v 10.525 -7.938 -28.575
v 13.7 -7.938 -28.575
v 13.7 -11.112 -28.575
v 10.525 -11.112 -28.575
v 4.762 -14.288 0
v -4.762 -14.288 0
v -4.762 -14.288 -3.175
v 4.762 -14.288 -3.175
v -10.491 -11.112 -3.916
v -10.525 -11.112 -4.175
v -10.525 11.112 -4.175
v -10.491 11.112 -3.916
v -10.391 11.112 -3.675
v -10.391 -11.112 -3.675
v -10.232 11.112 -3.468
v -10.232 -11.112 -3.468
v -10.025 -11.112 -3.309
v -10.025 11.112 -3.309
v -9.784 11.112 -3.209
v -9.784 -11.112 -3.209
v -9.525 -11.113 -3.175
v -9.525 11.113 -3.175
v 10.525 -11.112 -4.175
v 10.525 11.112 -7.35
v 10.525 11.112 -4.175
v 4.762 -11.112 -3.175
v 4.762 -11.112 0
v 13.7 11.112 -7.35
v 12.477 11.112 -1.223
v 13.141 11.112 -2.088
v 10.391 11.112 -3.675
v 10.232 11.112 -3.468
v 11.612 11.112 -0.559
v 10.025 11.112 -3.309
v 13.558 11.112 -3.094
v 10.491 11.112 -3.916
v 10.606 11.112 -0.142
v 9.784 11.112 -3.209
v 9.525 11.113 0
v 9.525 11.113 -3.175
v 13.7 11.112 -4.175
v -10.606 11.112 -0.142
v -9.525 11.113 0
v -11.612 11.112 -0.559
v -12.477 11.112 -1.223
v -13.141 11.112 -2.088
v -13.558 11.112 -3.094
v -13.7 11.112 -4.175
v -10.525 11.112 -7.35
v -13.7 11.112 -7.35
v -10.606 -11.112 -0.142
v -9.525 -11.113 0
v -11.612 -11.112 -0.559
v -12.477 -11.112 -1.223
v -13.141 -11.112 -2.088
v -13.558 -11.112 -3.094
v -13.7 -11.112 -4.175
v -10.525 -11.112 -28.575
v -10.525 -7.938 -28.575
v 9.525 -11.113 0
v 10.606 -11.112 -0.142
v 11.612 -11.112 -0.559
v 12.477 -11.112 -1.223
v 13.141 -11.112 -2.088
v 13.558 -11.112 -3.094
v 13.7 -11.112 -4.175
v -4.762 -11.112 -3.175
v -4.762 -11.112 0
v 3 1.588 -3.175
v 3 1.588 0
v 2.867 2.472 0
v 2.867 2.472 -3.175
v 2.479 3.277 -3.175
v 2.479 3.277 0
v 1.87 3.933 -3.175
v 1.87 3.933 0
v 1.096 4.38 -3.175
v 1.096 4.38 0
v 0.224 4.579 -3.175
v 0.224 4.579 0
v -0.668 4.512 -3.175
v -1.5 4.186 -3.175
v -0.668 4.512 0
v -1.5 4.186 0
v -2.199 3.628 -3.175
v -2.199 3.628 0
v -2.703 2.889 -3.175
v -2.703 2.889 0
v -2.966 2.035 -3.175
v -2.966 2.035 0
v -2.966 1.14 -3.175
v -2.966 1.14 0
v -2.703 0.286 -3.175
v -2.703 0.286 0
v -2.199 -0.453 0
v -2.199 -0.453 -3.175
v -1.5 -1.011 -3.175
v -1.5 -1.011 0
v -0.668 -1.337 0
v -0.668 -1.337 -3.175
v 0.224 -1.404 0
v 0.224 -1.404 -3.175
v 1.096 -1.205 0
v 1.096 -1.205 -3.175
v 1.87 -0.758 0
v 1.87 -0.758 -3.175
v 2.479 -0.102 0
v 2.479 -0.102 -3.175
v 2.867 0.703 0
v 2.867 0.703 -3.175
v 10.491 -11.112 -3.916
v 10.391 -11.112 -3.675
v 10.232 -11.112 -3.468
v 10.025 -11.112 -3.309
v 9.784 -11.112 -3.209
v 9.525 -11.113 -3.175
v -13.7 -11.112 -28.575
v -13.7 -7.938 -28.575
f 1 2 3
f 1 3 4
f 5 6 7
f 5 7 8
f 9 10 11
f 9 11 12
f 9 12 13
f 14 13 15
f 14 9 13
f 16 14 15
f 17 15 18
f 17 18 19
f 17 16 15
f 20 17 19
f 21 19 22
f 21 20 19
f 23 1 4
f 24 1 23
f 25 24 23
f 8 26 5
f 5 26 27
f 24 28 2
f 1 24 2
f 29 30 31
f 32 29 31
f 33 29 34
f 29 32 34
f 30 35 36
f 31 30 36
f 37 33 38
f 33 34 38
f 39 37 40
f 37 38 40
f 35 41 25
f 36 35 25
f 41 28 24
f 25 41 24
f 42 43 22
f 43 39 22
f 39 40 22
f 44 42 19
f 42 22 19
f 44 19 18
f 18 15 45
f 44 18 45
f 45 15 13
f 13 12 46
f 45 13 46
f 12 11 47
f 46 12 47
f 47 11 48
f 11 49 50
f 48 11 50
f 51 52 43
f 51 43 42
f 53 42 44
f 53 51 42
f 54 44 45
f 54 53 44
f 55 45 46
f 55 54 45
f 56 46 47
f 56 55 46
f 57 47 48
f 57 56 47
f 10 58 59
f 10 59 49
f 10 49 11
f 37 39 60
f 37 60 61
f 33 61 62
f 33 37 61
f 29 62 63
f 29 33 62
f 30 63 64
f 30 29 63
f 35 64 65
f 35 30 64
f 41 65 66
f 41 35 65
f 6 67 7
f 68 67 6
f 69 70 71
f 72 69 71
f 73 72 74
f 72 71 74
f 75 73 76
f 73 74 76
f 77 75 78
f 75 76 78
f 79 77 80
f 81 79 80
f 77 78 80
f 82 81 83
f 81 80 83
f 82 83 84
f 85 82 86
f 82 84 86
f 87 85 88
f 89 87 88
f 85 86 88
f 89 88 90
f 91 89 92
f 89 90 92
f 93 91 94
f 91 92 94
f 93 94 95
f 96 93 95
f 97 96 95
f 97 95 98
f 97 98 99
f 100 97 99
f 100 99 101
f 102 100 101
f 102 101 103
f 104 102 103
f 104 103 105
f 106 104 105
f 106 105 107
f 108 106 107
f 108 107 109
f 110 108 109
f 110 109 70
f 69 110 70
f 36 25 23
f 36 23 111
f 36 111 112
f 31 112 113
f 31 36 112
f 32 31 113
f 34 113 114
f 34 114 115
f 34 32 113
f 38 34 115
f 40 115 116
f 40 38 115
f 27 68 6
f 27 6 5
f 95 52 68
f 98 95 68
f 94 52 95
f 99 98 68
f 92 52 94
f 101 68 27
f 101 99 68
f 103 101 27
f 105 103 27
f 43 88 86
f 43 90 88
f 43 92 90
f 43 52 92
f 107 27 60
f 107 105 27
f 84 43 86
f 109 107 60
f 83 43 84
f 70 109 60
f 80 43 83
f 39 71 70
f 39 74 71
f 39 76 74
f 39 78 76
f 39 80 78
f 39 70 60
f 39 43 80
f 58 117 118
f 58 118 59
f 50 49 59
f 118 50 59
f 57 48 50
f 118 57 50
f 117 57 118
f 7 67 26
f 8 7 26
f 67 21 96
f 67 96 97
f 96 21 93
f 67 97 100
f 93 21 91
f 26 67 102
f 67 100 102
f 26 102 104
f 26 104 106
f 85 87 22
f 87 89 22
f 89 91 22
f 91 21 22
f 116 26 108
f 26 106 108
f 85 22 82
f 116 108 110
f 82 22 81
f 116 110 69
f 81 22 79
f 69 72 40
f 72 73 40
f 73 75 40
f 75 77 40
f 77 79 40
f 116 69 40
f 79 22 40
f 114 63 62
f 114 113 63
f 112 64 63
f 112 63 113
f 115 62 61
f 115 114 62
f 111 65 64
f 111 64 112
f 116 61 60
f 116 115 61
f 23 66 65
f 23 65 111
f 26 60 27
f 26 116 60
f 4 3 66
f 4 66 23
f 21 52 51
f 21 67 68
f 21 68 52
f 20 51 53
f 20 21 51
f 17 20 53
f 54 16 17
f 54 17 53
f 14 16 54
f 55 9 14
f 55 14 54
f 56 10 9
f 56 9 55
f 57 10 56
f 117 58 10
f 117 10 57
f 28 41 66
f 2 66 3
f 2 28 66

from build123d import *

# Parameters (mm, degrees)
SKETCH1_W           = 19.05
SKETCH1_H           = 22.225
BASE_FLANGE1_DEPTH  = 3.175
EDGE_FLANGE1_DEPTH  = 22.225
EDGE_FLANGE2_DEPTH  = 22.225
CUT_EXTRUDE1_DEPTH  = 42.119074421
SKETCH13_W          = 9.525
SKETCH13_H          = 3.175
BOSS_EXTRUDE1_DEPTH = 3.175
CUT_EXTRUDE2_DEPTH  = 35.761376285


# Sheet-metal steps are written as plain solids
with BuildPart() as part:
    # Sketch1 → Base-Flange1 (new body)
    with BuildSketch(Plane.XY):
        Rectangle(SKETCH1_W, SKETCH1_H)
    extrude(amount=-BASE_FLANGE1_DEPTH)

    # Edge-Flange1 section (across the edge) → Edge-Flange1 (add)
    with BuildSketch(Plane(origin=(10.525, 11.1125, -3.175), x_dir=(-1, 0, 0), z_dir=(0, -1, 0))):
        with BuildLine():
            Line((-3.175, 1), (-3.175, 25.4))
            Line((-3.175, 25.4), (0, 25.4))
            Line((0, 25.4), (0, 1))
            ThreePointArc((0, 1), (0.292893219, 0.292893219), (1, 0))
            Line((1, 0), (1, -3.175))
            ThreePointArc((1, -3.175), (-1.952170811, -1.952170811), (-3.175, 1))
        make_face()
    extrude(amount=EDGE_FLANGE1_DEPTH)

    # Edge-Flange2 section (across the edge) → Edge-Flange2 (add)
    with BuildSketch(Plane(origin=(-10.525, -11.1125, -3.175), x_dir=(1, 0, 0), z_dir=(0, 1, 0))):
        with BuildLine():
            Line((-3.175, 1), (-3.175, 25.4))
            Line((-3.175, 25.4), (0, 25.4))
            Line((0, 25.4), (0, 1))
            ThreePointArc((0, 1), (0.292893219, 0.292893219), (1, 0))
            Line((1, 0), (1, -3.175))
            ThreePointArc((1, -3.175), (-1.952170811, -1.952170811), (-3.175, 1))
        make_face()
    extrude(amount=EDGE_FLANGE2_DEPTH)

    # Sketch12 → Cut-Extrude1 (cut, through all)
    with BuildSketch(Plane(origin=(13.7, 0, 0), x_dir=(0, 0, -1), z_dir=(1, 0, 0))):
        Polygon((28.575, 11.1125), (7.35, 11.1125), (28.575, -7.9375), align=None)
    extrude(amount=-CUT_EXTRUDE1_DEPTH, mode=Mode.SUBTRACT)

    # Sketch13 → Boss-Extrude1 (add)
    with BuildSketch(Plane.XZ.offset(11.1125)):
        with Locations((0, -1.5875)):
            Rectangle(SKETCH13_W, SKETCH13_H)
    extrude(amount=BOSS_EXTRUDE1_DEPTH)

    # Sketch14 → Cut-Extrude2 (cut, through all)
    with BuildSketch(Plane.XY):
        with BuildLine():
            ThreePointArc((-3, 1.5875), (0, -1.4125), (3, 1.5875))
            Line((3, 1.5875), (-3, 1.5875))
        make_face()
        with BuildLine():
            Line((-3, 1.5875), (3, 1.5875))
            ThreePointArc((3, 1.5875), (0, 4.5875), (-3, 1.5875))
        make_face()
    extrude(amount=-CUT_EXTRUDE2_DEPTH, mode=Mode.SUBTRACT)


solid = part.part
